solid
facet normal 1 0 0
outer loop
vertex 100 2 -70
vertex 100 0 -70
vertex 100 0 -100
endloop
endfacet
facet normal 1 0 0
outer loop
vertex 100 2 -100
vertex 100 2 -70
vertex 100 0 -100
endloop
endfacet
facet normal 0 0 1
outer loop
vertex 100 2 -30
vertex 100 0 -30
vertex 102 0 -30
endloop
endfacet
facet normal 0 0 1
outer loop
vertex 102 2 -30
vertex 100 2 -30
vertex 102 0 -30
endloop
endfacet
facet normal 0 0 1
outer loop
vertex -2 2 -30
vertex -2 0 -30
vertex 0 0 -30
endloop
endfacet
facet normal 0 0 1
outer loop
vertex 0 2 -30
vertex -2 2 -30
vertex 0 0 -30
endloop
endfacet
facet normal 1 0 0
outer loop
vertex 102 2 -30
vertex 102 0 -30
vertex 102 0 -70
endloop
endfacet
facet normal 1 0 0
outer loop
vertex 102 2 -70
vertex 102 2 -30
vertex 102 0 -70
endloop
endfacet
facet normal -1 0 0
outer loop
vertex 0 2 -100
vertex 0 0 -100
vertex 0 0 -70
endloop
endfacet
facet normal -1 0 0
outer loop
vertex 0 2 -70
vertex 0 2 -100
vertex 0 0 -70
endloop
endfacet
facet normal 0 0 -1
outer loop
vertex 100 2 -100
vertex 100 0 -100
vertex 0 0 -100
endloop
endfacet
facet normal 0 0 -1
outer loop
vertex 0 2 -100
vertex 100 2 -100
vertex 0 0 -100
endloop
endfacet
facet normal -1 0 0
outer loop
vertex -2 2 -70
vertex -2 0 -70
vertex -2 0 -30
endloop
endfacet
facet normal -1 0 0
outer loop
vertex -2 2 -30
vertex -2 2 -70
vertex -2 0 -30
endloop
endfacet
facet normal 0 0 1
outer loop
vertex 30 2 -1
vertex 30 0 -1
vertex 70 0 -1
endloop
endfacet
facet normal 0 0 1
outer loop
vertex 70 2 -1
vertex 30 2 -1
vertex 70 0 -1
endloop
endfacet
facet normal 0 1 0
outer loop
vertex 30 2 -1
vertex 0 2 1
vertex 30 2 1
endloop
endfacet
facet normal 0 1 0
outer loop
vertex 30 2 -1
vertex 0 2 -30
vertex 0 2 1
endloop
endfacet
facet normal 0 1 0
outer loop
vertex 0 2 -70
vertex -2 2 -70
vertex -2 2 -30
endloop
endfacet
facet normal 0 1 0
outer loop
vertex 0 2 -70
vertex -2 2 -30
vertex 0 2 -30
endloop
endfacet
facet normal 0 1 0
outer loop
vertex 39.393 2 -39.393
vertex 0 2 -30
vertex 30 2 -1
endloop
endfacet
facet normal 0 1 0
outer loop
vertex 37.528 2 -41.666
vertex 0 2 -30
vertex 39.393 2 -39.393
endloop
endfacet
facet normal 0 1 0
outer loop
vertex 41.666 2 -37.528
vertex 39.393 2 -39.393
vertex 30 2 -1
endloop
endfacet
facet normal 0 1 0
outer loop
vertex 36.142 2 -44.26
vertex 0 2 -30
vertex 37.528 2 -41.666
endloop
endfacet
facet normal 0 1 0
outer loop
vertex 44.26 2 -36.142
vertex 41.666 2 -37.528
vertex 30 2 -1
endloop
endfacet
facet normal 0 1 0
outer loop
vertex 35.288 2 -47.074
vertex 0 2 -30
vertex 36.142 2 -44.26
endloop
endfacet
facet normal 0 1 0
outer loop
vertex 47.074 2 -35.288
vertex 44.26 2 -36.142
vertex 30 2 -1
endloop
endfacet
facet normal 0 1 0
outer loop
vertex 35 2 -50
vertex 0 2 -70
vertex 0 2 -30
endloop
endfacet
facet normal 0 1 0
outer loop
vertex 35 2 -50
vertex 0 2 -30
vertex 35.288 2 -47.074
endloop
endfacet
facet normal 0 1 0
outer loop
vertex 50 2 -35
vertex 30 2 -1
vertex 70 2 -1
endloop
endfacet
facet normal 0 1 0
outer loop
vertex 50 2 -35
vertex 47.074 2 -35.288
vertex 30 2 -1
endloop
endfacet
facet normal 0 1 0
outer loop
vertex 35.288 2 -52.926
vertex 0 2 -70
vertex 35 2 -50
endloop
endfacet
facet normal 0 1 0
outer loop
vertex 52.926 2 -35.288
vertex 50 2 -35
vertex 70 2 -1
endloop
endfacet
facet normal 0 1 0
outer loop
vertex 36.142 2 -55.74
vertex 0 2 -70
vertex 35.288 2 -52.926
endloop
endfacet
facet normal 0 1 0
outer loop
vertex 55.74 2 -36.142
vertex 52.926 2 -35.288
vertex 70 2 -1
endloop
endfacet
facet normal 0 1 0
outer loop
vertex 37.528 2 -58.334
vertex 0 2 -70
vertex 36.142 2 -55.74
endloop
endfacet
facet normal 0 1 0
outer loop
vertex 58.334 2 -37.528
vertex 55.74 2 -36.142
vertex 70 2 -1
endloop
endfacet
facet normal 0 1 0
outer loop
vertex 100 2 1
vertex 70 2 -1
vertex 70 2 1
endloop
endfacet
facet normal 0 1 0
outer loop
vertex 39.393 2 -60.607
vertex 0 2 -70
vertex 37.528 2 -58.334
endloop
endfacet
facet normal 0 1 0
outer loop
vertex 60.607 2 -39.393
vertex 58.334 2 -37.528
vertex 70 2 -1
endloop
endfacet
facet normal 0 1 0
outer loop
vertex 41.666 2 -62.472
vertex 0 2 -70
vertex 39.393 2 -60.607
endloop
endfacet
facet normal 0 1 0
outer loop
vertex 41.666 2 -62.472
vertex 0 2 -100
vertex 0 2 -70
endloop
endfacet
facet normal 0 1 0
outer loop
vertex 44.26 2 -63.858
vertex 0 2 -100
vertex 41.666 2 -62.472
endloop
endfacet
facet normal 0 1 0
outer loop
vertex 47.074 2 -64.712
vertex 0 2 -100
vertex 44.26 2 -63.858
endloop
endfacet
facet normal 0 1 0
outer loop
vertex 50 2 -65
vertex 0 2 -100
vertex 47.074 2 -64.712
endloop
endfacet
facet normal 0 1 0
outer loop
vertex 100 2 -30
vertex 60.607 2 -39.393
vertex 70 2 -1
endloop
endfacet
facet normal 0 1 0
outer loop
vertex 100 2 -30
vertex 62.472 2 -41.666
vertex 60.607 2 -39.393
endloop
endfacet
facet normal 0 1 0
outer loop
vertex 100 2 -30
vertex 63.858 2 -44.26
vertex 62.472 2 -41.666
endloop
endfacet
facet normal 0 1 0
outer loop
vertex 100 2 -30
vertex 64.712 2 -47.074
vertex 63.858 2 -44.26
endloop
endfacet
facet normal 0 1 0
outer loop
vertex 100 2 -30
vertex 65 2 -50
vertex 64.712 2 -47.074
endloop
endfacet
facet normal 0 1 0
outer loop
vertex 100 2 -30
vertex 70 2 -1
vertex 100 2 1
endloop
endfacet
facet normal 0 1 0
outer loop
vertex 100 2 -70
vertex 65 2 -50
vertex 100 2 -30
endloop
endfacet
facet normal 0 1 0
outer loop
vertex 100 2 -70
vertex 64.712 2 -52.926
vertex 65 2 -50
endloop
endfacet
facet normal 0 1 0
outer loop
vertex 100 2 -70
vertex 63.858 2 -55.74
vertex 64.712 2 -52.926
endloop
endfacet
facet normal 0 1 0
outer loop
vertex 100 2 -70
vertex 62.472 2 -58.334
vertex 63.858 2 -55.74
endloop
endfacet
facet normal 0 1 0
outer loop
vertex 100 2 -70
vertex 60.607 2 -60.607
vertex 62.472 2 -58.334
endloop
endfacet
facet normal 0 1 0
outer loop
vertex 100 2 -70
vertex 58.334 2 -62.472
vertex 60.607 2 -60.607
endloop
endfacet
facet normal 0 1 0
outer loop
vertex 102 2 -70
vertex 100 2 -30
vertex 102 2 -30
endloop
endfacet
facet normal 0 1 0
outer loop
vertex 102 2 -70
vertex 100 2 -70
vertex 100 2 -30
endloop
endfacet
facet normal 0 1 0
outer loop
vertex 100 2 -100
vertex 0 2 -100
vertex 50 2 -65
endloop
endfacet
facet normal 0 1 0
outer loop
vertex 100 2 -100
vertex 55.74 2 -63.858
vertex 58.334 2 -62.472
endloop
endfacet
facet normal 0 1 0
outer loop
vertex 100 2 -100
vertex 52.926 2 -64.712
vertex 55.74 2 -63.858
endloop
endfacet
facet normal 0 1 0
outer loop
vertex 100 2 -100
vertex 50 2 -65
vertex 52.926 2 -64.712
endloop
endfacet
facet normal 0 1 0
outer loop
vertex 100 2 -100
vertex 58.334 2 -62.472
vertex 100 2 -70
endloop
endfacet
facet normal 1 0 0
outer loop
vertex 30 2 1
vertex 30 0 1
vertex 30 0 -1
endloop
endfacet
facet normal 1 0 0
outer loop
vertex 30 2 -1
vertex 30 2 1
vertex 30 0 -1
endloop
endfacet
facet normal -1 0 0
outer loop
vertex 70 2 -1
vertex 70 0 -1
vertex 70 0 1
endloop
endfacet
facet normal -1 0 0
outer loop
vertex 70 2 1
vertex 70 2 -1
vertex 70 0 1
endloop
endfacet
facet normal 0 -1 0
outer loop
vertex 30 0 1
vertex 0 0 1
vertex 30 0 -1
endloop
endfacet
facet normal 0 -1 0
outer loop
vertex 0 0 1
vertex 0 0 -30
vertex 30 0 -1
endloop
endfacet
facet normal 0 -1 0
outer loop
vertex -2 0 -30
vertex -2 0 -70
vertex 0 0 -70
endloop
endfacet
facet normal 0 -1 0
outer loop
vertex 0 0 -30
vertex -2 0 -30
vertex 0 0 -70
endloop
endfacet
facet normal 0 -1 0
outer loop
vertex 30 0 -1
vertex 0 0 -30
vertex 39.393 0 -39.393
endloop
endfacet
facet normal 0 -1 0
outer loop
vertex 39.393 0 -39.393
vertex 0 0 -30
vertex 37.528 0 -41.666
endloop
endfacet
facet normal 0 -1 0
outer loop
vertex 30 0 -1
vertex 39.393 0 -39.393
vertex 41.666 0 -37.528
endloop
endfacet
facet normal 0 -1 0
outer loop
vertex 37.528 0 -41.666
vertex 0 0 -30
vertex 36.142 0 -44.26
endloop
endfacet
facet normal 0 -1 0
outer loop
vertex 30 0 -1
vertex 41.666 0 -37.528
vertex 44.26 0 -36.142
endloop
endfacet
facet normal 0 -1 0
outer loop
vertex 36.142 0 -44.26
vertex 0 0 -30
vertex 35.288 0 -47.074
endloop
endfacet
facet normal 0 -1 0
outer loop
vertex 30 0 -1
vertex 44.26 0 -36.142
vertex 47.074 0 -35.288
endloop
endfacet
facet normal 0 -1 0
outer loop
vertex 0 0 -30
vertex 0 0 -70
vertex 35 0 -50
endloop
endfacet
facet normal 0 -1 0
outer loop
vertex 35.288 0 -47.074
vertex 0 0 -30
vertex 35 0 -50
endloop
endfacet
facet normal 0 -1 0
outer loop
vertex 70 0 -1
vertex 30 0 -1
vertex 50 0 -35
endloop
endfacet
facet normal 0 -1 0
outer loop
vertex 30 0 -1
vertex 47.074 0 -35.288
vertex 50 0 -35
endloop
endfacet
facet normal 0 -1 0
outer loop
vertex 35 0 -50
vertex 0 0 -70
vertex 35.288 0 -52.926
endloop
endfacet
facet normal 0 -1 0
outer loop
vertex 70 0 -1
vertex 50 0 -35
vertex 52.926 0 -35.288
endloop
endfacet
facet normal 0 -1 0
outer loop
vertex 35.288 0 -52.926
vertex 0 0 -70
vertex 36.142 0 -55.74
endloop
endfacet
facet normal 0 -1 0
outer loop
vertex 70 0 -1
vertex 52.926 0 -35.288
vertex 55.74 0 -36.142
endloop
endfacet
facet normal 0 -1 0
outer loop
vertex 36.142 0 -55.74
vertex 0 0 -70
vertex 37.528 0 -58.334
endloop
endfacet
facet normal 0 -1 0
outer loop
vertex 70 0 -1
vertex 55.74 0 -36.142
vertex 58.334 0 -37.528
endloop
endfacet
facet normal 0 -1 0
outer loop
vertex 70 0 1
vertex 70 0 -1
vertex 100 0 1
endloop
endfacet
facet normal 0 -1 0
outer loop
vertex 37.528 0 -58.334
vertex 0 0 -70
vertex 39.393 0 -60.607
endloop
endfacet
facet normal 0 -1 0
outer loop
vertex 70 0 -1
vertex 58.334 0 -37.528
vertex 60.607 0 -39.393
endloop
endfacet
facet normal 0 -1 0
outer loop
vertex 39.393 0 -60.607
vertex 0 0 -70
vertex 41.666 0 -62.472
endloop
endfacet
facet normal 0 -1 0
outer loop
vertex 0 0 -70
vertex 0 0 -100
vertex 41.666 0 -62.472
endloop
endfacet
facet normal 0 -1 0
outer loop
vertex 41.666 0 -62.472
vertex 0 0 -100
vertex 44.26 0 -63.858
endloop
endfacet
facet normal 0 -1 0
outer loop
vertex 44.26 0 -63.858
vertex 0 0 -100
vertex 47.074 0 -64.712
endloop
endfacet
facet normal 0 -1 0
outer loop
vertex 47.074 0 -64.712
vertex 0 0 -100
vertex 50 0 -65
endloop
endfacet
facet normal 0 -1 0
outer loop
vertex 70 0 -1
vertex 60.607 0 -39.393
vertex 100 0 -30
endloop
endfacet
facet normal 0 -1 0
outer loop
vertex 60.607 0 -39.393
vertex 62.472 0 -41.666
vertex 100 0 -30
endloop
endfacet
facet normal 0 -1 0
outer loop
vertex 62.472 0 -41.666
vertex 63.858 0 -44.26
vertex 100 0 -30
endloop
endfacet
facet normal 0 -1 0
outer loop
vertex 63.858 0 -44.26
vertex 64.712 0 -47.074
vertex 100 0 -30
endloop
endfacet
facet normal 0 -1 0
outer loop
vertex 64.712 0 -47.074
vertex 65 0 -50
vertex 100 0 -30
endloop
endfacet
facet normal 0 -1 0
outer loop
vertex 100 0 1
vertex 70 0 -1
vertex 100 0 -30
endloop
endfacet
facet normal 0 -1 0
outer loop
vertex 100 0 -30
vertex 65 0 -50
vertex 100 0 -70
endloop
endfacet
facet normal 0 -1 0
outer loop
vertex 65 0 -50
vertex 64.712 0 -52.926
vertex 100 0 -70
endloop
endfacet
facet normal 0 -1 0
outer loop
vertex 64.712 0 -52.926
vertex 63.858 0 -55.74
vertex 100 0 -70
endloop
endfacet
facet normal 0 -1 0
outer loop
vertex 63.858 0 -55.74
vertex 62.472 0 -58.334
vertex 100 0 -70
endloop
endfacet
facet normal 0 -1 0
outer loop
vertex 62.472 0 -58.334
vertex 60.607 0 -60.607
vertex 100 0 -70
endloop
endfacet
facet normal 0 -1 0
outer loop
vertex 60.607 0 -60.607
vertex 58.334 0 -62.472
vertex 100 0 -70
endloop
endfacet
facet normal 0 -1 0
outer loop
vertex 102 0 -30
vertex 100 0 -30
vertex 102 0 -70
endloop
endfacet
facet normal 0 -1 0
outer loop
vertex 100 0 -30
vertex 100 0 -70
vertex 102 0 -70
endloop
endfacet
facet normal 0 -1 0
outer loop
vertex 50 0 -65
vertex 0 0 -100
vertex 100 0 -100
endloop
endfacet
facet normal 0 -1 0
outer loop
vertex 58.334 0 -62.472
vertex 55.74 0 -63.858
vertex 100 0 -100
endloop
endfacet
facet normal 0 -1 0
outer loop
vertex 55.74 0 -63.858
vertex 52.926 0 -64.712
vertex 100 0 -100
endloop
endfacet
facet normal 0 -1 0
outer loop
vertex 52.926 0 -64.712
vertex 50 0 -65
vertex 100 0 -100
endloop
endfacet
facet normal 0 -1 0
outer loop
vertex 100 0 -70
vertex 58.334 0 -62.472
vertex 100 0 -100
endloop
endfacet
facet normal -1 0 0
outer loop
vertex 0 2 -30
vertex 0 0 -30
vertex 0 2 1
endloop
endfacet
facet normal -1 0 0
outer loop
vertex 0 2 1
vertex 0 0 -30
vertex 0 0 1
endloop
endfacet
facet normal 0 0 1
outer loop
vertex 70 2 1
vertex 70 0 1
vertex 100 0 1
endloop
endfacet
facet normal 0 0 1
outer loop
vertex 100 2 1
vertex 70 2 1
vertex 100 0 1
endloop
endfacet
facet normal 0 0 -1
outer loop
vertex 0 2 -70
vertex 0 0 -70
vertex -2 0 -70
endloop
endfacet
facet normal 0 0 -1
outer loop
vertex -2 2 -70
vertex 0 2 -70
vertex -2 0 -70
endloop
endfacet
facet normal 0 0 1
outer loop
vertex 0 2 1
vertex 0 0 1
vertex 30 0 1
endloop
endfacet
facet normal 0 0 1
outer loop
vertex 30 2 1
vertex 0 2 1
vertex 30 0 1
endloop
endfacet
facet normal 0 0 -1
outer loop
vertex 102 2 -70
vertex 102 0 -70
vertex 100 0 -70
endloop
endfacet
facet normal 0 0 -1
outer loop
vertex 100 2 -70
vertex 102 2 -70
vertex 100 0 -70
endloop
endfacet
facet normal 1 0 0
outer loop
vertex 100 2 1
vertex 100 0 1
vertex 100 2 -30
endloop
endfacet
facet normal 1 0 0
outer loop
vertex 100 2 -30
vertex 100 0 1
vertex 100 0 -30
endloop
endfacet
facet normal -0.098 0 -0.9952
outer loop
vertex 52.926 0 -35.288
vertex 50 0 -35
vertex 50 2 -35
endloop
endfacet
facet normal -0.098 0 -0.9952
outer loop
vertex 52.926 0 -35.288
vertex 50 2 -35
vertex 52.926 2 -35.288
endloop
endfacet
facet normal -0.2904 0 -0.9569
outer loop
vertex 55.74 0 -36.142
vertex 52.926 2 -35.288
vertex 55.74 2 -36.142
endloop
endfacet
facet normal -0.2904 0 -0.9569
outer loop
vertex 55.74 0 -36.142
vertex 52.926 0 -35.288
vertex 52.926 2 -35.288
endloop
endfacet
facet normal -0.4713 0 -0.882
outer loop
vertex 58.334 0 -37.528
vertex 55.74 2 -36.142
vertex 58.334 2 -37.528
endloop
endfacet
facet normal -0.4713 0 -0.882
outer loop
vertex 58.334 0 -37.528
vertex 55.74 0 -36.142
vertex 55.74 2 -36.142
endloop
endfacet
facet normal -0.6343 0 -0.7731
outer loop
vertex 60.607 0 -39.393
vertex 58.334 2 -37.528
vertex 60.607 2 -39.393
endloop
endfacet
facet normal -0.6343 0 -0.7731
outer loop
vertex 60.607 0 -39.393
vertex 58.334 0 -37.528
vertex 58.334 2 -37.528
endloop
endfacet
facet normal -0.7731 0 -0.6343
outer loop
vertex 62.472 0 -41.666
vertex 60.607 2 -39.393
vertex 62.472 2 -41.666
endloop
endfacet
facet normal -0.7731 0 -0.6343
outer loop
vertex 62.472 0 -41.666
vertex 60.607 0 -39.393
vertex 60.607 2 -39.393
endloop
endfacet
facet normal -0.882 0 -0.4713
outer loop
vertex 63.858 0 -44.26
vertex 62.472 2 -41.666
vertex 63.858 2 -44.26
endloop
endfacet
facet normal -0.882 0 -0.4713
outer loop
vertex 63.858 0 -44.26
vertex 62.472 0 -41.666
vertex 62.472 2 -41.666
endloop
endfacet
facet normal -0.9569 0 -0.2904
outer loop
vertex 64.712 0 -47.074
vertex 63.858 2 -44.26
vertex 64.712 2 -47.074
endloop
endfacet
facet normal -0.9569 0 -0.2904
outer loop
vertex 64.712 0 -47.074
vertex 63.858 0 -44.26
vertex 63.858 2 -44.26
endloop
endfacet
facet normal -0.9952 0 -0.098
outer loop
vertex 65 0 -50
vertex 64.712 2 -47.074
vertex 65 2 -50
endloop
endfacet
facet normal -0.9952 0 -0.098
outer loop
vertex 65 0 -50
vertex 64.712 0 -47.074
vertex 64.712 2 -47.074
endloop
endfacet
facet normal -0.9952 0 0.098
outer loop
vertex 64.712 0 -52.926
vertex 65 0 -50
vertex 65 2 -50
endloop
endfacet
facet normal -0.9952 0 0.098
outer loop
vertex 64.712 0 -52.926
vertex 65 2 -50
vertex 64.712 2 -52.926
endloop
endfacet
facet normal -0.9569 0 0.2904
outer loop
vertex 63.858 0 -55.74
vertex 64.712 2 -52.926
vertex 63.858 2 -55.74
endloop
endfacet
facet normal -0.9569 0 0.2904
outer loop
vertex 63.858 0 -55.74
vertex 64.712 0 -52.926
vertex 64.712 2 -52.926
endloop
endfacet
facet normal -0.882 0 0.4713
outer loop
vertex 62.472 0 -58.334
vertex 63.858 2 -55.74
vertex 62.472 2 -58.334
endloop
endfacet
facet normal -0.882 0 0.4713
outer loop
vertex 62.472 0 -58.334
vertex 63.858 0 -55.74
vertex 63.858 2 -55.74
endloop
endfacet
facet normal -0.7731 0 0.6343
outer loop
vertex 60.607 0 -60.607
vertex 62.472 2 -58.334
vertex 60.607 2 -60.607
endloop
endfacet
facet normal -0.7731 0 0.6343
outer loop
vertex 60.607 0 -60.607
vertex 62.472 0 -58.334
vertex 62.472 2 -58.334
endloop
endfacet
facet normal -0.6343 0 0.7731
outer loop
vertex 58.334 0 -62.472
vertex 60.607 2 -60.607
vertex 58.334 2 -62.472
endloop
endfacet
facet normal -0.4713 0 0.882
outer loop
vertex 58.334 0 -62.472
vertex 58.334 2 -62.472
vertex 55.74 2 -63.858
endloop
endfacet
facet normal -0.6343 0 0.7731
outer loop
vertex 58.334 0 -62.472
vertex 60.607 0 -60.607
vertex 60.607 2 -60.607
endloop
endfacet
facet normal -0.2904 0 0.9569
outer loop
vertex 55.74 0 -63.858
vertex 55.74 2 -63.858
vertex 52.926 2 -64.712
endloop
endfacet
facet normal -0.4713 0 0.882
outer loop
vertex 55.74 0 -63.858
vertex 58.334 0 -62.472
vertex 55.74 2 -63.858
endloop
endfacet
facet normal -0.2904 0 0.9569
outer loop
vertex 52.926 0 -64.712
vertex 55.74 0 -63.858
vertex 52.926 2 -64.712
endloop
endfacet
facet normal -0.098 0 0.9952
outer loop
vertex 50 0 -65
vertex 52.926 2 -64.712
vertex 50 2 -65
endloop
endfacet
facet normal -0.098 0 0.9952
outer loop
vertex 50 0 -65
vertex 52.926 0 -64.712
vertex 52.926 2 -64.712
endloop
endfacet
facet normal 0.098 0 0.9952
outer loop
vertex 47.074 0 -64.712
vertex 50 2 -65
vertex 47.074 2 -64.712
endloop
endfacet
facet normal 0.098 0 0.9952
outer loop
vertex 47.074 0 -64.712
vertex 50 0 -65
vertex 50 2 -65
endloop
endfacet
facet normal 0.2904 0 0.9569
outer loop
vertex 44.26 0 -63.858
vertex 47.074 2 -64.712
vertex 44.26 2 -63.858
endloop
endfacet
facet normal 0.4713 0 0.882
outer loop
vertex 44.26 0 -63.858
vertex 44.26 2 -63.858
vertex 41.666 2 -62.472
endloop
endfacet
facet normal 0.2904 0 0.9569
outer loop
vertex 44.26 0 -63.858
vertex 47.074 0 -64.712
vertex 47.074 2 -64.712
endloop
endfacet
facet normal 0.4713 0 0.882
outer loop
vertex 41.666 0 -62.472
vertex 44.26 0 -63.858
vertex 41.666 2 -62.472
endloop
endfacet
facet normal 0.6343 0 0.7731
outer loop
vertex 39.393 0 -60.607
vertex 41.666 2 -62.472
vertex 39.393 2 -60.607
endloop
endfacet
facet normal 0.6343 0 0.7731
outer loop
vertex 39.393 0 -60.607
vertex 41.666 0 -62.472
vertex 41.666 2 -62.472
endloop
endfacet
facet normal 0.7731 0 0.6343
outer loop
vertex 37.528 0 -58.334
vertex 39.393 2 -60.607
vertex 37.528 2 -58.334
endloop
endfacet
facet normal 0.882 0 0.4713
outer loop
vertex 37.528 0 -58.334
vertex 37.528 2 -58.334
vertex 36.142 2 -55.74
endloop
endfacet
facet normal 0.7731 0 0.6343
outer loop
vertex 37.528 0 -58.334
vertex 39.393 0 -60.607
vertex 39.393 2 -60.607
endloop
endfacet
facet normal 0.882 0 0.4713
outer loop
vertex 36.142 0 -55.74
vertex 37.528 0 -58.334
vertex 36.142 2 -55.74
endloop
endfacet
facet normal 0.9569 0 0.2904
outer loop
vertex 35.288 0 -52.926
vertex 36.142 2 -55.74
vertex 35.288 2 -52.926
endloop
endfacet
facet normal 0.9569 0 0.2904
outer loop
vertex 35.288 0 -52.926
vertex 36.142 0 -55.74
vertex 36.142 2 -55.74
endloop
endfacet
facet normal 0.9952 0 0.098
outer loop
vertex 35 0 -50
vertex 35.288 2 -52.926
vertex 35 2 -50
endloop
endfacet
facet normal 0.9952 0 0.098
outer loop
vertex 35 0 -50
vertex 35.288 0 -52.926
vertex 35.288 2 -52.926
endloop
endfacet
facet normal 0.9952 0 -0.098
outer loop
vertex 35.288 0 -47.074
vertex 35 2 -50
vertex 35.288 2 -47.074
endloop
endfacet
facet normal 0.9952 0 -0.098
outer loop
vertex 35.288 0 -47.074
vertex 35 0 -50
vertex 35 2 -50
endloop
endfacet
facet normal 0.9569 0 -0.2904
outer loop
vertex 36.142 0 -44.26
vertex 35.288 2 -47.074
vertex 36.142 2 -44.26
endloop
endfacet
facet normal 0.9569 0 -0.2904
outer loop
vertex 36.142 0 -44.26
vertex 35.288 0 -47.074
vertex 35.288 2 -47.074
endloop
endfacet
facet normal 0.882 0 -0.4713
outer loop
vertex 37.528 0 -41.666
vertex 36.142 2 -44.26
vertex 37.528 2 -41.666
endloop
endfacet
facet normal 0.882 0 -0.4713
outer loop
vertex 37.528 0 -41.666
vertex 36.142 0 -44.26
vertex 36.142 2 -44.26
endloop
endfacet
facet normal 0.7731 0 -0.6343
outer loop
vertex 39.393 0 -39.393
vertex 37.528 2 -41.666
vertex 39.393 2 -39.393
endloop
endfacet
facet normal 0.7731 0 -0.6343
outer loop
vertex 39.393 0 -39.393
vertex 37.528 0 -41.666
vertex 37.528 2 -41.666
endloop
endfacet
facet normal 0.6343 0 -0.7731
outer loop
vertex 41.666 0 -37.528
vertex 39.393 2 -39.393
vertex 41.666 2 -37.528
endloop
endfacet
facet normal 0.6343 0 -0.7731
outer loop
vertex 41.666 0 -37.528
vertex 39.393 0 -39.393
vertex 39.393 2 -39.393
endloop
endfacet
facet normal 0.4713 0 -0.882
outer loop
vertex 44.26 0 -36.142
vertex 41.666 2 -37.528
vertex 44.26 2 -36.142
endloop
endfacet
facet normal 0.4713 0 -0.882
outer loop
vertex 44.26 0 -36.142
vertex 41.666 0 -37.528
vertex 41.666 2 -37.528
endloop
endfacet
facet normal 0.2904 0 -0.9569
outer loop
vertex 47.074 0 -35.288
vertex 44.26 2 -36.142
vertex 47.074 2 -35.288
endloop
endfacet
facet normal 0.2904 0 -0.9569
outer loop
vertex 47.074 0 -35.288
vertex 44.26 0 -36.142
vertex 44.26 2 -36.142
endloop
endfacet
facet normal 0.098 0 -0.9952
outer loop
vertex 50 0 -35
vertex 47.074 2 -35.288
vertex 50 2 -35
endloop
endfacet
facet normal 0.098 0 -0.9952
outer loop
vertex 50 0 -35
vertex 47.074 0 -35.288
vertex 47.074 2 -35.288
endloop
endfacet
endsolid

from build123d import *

# Parameters (mm, degrees)
SKETCH_1_R      = 15
EXTRUDE_1_DEPTH = 2


with BuildPart() as part:
    # 草图1 → 凸台-拉伸1 (new body)
    with BuildSketch(Plane(origin=(0, 0, 0), x_dir=(1, 0, 0), z_dir=(0, 1, 0))):
        Polygon((0, -1), (30, -1), (30, 1), (70, 1), (70, -1), (100, -1), (100, 30), (102, 30), (102, 70), (100, 70), (100, 100), (0, 100), (0, 70), (-2, 70), (-2, 30), (0, 30), align=None)
        with Locations(Location((50, 50, 0), (0, 0, 270))):
            Circle(SKETCH_1_R, mode=Mode.SUBTRACT)
    extrude(amount=EXTRUDE_1_DEPTH)


solid = part.part
